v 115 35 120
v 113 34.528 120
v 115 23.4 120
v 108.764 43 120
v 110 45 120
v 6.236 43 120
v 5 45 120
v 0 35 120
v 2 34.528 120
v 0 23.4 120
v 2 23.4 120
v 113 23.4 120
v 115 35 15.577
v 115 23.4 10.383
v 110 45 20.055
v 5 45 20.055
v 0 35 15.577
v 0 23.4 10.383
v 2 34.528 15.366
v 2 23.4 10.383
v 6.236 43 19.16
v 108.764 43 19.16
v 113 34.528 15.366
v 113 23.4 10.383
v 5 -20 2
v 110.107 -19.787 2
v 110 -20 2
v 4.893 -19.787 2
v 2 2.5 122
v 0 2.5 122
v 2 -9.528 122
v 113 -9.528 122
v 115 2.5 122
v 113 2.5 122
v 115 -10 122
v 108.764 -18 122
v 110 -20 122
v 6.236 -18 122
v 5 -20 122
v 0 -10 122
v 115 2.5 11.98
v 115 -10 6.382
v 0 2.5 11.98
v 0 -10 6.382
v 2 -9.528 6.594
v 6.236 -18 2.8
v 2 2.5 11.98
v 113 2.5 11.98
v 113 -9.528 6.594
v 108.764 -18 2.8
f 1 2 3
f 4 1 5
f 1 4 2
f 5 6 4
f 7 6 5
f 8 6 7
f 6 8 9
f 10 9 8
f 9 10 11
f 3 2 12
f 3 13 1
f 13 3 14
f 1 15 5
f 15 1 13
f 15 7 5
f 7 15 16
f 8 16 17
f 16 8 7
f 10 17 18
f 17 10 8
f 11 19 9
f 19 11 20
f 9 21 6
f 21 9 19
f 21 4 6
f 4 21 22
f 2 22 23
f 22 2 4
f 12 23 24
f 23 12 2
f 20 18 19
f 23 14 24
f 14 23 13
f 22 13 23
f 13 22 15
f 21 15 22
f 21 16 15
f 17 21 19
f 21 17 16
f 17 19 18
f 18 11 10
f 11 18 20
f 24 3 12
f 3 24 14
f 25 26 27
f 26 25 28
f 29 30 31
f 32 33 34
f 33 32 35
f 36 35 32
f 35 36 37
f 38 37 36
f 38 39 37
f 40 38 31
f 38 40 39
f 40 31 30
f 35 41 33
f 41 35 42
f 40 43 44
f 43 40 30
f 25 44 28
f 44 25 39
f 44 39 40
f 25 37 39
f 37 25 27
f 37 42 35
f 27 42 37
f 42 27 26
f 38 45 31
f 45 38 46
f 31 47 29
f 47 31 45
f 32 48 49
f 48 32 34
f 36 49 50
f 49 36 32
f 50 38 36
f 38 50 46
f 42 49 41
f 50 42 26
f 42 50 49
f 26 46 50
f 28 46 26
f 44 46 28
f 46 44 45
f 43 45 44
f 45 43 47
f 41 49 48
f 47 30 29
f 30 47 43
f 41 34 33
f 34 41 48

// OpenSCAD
module schale(){
    difference(){
        linear_extrude(height=120){
            difference(){
                polygon(points=[[5,0],[110,0],[115,10],[115,35],[110,45],[5,45],[0,35],[0,10]], paths=[[0,1,2,3,4,5,6,7]]);
                offset(delta=-2){
                    polygon(points=[[5,0],[110,0],[115,10],[115,35],[110,45],[5,45],[0,35],[0,10]], paths=[[0,1,2,3,4,5,6,7]]);
                }
            }
        }


        rotate([0,-90,0]) translate([0,0,-122]) linear_extrude(height=123){
            polygon(points=[[-0.1,-0.01],[20.1,45.1],[-0.10,45.1]],paths=[[0,1,2]]);
        }
    }
}
difference(){
    schale();
   
   translate([-0.1,-0.10,0])cube([116,47/2,128]);

}

translate([-0,-20,2]){difference(){
    schale();
    #translate([-0.1,45/2,0])cube([116,45.1/2,128]);

}}
